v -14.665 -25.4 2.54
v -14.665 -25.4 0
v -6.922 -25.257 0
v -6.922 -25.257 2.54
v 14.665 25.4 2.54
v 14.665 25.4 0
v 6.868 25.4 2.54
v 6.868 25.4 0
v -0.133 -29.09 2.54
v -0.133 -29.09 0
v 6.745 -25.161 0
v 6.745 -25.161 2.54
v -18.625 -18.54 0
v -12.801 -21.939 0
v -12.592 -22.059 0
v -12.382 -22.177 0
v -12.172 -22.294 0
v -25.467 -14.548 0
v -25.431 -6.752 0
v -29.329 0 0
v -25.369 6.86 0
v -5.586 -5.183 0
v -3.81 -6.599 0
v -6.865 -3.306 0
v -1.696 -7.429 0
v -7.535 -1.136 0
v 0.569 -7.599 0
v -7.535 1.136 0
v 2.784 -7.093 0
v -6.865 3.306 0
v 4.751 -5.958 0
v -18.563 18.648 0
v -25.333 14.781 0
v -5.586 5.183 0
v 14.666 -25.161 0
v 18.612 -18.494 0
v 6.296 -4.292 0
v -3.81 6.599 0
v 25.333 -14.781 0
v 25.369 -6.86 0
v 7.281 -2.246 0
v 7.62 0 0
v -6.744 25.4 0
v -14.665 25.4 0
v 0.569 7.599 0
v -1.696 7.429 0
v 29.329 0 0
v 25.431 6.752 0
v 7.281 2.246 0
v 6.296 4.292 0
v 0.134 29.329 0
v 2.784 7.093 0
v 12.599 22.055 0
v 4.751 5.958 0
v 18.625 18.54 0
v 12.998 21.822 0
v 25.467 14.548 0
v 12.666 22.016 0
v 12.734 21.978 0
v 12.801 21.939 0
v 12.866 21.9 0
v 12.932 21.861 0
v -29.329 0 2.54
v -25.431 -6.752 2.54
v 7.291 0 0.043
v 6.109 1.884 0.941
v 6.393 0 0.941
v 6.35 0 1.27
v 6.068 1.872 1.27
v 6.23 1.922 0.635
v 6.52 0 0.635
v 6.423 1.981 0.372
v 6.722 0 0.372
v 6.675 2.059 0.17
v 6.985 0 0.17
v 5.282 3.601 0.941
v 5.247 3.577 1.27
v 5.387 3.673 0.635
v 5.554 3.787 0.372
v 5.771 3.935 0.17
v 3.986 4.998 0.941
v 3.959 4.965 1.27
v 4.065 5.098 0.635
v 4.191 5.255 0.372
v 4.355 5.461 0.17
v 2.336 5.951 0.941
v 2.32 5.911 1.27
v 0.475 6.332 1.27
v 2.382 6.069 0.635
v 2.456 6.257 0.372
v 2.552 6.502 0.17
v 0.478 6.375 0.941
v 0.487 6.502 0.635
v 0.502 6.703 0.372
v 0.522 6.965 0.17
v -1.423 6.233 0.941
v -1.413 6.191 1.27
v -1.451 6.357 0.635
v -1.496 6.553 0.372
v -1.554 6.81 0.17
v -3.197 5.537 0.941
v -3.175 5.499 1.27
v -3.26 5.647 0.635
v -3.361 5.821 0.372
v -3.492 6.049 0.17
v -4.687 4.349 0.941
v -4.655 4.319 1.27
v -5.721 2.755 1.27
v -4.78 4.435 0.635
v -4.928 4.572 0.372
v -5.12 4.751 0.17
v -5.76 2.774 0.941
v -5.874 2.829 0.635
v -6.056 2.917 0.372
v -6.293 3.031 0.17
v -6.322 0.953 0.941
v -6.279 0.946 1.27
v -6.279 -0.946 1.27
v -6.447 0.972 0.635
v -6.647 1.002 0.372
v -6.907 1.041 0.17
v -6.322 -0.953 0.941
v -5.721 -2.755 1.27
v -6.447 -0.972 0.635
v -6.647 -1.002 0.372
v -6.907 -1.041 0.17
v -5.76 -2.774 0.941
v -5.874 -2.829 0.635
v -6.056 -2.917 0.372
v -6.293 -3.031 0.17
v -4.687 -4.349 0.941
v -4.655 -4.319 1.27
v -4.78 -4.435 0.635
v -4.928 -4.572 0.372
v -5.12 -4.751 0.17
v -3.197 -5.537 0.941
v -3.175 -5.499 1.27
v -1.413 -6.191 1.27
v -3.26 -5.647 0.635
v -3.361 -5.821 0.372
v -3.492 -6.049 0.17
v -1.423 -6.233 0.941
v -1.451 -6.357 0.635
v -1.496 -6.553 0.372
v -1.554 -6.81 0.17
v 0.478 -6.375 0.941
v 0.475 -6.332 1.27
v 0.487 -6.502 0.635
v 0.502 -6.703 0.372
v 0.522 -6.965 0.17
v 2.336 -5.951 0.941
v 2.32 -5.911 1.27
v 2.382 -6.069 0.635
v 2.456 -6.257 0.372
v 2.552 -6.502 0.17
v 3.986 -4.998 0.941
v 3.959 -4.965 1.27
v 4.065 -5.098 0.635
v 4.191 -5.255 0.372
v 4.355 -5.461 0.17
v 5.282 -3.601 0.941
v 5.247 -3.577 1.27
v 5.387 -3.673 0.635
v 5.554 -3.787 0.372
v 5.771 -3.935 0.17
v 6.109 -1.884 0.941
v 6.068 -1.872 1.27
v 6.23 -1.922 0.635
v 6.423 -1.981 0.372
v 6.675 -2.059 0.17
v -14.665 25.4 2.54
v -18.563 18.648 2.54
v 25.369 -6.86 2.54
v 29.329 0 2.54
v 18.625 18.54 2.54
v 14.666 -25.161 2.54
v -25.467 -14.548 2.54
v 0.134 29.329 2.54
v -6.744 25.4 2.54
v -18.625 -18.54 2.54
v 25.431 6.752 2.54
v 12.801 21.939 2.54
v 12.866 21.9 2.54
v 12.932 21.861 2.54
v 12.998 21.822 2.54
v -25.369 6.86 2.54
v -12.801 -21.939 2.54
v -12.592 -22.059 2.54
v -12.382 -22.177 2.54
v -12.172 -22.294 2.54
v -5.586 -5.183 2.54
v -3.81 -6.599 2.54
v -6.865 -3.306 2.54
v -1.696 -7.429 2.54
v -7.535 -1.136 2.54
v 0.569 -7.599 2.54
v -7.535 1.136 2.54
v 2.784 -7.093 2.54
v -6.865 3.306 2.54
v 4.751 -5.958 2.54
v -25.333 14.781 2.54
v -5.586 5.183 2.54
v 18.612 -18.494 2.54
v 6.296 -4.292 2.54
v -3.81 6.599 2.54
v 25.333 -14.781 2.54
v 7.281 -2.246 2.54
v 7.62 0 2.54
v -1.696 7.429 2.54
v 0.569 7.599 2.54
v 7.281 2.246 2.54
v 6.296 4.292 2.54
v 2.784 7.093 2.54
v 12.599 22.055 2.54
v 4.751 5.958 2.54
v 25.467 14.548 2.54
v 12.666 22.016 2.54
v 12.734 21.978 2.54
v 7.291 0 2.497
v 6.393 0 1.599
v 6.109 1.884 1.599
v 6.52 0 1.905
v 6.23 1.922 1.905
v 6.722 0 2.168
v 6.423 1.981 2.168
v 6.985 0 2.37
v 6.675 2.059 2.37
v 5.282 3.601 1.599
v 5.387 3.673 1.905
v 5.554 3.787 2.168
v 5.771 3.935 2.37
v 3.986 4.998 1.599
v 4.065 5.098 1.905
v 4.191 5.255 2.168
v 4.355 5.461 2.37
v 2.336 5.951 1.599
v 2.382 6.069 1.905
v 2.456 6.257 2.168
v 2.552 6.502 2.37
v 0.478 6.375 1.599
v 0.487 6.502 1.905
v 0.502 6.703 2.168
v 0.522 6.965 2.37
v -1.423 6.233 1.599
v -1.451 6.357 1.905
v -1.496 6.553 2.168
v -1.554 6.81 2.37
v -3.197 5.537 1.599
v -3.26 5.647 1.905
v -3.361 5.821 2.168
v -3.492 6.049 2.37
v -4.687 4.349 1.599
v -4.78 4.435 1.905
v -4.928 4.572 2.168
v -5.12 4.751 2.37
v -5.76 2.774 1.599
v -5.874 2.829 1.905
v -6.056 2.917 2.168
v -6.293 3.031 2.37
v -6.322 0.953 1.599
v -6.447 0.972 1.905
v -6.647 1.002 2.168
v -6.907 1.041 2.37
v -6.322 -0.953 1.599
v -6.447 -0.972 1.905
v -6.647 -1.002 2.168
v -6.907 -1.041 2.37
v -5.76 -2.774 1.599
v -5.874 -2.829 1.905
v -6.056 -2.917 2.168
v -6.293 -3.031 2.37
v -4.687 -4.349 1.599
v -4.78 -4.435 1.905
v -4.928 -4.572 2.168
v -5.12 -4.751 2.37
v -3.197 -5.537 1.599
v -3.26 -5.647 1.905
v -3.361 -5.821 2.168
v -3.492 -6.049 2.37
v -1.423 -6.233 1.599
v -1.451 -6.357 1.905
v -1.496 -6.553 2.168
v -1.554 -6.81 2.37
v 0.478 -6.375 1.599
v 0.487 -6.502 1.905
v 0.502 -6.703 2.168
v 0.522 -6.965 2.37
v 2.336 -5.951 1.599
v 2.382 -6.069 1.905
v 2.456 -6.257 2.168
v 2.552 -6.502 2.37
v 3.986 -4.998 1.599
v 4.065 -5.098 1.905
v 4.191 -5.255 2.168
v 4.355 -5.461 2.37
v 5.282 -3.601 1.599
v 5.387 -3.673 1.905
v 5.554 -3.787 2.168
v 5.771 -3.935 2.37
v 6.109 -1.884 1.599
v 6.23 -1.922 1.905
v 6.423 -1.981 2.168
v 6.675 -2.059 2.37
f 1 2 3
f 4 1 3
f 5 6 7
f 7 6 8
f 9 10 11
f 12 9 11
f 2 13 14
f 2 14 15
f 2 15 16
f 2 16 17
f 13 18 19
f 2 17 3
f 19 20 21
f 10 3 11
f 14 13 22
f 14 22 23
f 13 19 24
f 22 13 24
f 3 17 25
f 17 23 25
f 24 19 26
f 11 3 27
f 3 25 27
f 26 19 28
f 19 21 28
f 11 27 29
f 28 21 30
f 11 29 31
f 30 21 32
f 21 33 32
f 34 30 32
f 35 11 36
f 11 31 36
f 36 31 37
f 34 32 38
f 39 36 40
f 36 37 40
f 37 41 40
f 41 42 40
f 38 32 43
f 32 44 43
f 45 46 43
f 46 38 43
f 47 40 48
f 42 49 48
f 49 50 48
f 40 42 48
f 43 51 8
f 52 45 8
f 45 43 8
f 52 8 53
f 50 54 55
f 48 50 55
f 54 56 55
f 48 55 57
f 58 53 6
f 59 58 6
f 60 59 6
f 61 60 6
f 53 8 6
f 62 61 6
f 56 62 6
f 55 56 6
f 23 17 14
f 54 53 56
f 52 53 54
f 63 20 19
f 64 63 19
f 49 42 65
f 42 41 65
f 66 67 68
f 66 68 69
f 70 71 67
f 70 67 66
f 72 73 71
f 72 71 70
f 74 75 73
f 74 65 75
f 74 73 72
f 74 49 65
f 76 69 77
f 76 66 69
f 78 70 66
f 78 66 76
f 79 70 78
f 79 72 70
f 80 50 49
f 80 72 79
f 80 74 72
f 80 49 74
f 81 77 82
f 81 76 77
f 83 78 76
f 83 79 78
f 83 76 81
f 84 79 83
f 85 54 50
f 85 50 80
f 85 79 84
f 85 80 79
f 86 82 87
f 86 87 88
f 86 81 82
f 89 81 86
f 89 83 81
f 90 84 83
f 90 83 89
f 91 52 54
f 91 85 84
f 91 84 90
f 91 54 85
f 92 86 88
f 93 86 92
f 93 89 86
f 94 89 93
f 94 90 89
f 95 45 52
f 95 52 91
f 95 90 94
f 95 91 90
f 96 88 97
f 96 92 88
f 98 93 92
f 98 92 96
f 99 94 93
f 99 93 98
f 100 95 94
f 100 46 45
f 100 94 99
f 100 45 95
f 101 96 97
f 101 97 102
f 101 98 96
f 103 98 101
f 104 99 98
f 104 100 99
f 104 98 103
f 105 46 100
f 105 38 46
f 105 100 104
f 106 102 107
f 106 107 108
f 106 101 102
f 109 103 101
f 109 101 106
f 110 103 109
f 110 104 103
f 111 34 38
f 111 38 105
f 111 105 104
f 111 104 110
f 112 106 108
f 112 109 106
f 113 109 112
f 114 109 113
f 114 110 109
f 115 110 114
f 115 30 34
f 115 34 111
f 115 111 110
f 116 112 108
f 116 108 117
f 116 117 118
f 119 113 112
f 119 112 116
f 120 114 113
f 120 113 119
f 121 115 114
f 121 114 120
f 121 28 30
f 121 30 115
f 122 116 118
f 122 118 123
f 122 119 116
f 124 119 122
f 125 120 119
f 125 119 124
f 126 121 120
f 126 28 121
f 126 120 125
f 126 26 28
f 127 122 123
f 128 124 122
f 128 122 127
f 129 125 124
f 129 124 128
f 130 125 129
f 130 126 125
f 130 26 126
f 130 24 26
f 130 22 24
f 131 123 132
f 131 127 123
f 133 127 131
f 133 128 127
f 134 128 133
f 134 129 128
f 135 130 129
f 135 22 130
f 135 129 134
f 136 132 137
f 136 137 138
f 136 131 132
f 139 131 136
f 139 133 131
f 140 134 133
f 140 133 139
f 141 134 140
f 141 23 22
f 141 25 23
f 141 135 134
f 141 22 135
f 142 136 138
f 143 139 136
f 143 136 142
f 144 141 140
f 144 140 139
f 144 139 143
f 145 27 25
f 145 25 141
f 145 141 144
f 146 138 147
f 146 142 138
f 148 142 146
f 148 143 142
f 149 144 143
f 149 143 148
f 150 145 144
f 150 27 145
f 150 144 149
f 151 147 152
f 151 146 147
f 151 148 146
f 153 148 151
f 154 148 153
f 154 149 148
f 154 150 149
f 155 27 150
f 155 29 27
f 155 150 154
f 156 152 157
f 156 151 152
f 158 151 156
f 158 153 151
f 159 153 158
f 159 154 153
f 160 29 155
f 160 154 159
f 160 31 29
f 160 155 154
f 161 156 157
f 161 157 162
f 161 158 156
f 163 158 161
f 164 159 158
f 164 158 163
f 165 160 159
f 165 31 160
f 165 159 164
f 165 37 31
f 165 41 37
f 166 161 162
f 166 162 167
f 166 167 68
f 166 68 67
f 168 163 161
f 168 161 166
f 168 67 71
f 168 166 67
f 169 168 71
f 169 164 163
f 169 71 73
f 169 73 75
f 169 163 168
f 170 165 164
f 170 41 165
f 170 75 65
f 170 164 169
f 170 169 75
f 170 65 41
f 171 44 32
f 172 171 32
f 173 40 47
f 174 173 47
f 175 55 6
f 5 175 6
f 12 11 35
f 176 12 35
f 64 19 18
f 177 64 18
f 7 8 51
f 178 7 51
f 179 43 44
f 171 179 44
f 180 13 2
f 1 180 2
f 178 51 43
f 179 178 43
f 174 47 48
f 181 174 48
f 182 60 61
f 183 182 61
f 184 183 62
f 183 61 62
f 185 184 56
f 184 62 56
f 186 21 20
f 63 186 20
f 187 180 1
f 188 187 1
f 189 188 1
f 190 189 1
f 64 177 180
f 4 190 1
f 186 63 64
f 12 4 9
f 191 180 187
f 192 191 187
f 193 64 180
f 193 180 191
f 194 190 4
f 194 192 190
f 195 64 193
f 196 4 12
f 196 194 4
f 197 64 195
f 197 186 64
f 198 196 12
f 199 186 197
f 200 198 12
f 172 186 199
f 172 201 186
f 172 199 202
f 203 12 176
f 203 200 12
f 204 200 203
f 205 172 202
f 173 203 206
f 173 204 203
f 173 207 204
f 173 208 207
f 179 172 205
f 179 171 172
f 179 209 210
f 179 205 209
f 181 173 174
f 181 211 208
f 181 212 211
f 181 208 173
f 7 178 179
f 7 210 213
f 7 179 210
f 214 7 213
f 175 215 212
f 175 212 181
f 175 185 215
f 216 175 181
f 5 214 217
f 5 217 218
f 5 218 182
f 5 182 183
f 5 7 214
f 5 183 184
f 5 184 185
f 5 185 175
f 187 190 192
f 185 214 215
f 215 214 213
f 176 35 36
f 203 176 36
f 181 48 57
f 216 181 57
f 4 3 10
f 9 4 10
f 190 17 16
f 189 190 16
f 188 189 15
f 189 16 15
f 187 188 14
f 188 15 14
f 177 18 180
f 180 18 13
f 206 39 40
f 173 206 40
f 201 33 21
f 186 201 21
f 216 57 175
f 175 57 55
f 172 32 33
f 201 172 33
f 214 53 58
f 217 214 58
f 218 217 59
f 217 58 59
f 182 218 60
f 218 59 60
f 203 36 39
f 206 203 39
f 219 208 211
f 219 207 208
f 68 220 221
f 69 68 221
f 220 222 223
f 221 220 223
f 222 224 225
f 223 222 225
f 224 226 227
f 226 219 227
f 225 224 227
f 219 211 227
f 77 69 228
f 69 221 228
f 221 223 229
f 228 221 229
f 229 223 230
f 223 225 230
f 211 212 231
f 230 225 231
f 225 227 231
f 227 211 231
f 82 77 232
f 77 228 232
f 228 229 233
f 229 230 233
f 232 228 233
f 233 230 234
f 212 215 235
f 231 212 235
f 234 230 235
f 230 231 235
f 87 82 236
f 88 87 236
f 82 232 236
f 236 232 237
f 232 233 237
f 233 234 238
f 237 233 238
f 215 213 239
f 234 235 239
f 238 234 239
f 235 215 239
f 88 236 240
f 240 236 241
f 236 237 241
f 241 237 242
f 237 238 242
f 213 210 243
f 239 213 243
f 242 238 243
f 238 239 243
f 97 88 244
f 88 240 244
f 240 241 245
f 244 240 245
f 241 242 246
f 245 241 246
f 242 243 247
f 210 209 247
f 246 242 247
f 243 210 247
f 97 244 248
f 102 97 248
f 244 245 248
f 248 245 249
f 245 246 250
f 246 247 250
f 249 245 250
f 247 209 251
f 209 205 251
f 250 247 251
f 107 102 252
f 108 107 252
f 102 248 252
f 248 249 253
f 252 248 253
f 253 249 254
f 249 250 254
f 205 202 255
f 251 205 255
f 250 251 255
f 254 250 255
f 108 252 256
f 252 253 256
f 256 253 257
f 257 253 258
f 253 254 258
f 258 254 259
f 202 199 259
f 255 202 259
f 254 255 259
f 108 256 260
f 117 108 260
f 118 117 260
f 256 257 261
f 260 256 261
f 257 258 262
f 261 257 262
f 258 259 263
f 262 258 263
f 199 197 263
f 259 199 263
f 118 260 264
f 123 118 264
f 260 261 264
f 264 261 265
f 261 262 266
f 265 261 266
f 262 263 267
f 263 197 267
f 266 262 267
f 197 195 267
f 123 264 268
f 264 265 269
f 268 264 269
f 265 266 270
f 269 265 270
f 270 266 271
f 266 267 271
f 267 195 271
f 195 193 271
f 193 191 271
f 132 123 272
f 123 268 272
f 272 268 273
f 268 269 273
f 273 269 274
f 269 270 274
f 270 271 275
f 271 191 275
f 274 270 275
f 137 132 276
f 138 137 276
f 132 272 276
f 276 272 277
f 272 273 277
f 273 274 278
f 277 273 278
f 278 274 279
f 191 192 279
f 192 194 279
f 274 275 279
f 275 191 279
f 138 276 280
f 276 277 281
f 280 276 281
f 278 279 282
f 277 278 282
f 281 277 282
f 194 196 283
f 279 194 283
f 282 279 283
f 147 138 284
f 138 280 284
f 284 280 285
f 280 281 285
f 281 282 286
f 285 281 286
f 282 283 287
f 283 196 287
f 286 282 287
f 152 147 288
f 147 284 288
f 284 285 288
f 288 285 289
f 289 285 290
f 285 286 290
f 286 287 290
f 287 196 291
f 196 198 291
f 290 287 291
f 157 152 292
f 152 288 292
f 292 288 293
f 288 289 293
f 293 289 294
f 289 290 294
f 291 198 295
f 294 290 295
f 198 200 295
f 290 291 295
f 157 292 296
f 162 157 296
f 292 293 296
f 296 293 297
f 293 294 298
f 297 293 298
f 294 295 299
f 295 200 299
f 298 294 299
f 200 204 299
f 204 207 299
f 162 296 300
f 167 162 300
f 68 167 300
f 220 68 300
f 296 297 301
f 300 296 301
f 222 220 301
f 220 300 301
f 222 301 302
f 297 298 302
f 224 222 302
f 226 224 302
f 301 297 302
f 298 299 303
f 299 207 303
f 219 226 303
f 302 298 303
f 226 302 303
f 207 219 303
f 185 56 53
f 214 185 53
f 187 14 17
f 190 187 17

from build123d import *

# Parameters (mm, degrees)
F0_R     = 6.35
F1_DEPTH = 2.54
F2_R     = 1.26999


# Not quite as in the source:
# - a fillet or chamfer is up to 0.001 mm smaller than in the source, because OpenCascade refuses the exact size


with BuildPart() as f1:
    # F0 (on Top) → F1 (new body)
    with BuildSketch(Plane.XY):
        with BuildLine():
            Line((0.1342973504, 29.3290862039), (12.5991438484, 22.0549671115))
            ThreePointArc((12.5991438484, 22.0549671115), (12.7000000903, 21.997045204), (12.8005900541, 21.9386620893))
            Line((12.8005900541, 21.9386620893), (6.8682756911, 25.4))
            Line((6.8682756911, 25.4), (0.1342973504, 29.3290862039))
        make_face()
        with BuildLine():
            ThreePointArc((-12.5991438484, 22.0549671115), (0, 25.4), (12.5991438484, 22.0549671115))
            Line((12.5991438484, 22.0549671115), (0.1342973504, 29.3290862039))
            Line((0.1342973504, 29.3290862039), (-6.7436197563, 25.4))
            Line((-6.7436197563, 25.4), (-12.5991438484, 22.0549671115))
        make_face()
        Polygon((-18.5629074106, 18.6481012287), (-12.5991438484, 22.0549671115), (-6.7436197563, 25.4), (-14.6646968374, 25.4), align=None)
        with BuildLine():
            ThreePointArc((-25.3997337218, 0.1163050384), (-21.9386621638, 12.8005899263), (-12.5991438484, 22.0549671115))
            Line((-12.5991438484, 22.0549671115), (-18.5629074106, 18.6481012287))
            Line((-18.5629074106, 18.6481012287), (-25.3325850472, 14.780848019))
            Line((-25.3325850472, 14.780848019), (-25.3688551343, 6.8598539776))
            Line((-25.3688551343, 6.8598539776), (-25.3997337218, 0.1163050384))
        make_face()
        with BuildLine():
            Line((18.625235378, 18.5401460224), (12.8005900541, 21.9386620893))
            ThreePointArc((12.8005900541, 21.9386620893), (12.8993470878, 21.8807414113), (12.9978420445, 21.822376181))
            Line((12.9978420446, 21.822376181), (25.4668823975, 14.5482381848))
            Line((25.4668823975, 14.5482381848), (18.625235378, 18.5401460224))
        make_face()
        Polygon((6.8682756911, 25.4), (12.8005900541, 21.9386620893), (18.625235378, 18.5401460224), (14.6646968374, 25.4), align=None)
        with BuildLine():
            Line((25.4668823975, 14.5482381848), (12.9978420446, 21.822376181))
            ThreePointArc((12.9978420445, 21.822376181), (22.0828574683, 12.550195458), (25.4, 0))
            ThreePointArc((25.4, 0), (25.3999334305, -0.0581525957), (25.3997337225, -0.1163048866))
            Line((25.3997337225, -0.1163048866), (25.4002662804, 0))
            Line((25.4002662804, 0), (25.4311831017, 6.7518987713))
            Line((25.4311831017, 6.7518987713), (25.4668823975, 14.5482381848))
        make_face()
        Polygon((-25.4002662804, 0), (-25.3997337218, 0.1163050384), (-25.3688551343, 6.8598539776), (-29.3293936748, 0), (-25.4311831017, -6.7518987713), align=None)
        with BuildLine():
            ThreePointArc((-21.9970455091, -12.6999995618), (-24.5495027703, -6.5178151043), (-25.3997337218, 0.1163050384))
            Line((-25.3997337218, 0.1163050384), (-25.4002662804, 0))
            Line((-25.4002662804, 0), (-25.4311831017, -6.7518987713))
            Line((-25.4311831017, -6.7518987713), (-21.9970455091, -12.6999995618))
        make_face()
        with BuildLine():
            ThreePointArc((-12.800589874, -21.9386621944), (-18.0015854544, -17.9193448856), (-21.9970455091, -12.6999995618))
            Line((-21.9970455091, -12.6999995618), (-18.625235378, -18.5401460224))
            Line((-18.625235378, -18.5401460224), (-12.800589874, -21.9386621944))
        make_face()
        Polygon((-18.625235378, -18.5401460224), (-21.9970455091, -12.6999995618), (-25.4311831017, -6.7518987713), (-25.4668823975, -14.5482381848), align=None)
        with BuildLine():
            Line((25.3688551343, -6.8598539776), (25.3997337225, -0.1163048866))
            ThreePointArc((25.3997337225, -0.1163048866), (22.6367712709, -11.5211365077), (15.0421744156, -20.4668754052))
            Line((15.0421744156, -20.4668754052), (18.6118299226, -18.4944410973))
            Line((18.6118299226, -18.4944410973), (25.3325850472, -14.780848019))
            Line((25.3325850472, -14.780848019), (25.3688551343, -6.8598539776))
        make_face()
        Polygon((25.4002662804, 0), (25.3997337225, -0.1163048866), (25.3688551343, -6.8598539776), (29.3293936748, 0), (25.4311831017, 6.7518987713), align=None)
        with BuildLine():
            ThreePointArc((-12.1717221157, -22.2937027149), (-12.4874178664, -22.1184175526), (-12.800589874, -21.9386621944))
            Line((-12.800589874, -21.9386621944), (-18.625235378, -18.5401460224))
            Line((-18.625235378, -18.5401460224), (-14.6646968374, -25.4))
            Line((-14.6646968374, -25.4), (-6.9223574365, -25.2573419592))
            Line((-6.9223574365, -25.2573419592), (-12.1717221157, -22.2937027149))
        make_face()
        with BuildLine():
            Line((18.6118299226, -18.4944410973), (15.0421744156, -20.4668754052))
            ThreePointArc((15.0421744156, -20.4668754052), (12.4565037471, -22.1358423015), (9.6879678482, -23.4798483592))
            Line((9.6879678482, -23.4798483592), (6.7447131478, -25.1612151536))
            Line((6.7447131478, -25.1612151536), (14.6657902289, -25.1612151536))
            Line((14.6657902289, -25.1612151536), (18.6118299226, -18.4944410973))
        make_face()
        with BuildLine():
            ThreePointArc((9.6879678482, -23.4798483592), (-1.3762246139, -25.3626892465), (-12.1717221157, -22.2937027149))
            Line((-12.1717221157, -22.2937027149), (-6.9223574365, -25.2573419592))
            Line((-6.9223574365, -25.2573419592), (-0.1332039589, -29.0903013575))
            Line((-0.1332039589, -29.0903013575), (6.7447131478, -25.1612151536))
            Line((6.7447131478, -25.1612151536), (9.6879678482, -23.4798483592))
        make_face()
        with BuildLine():
            Line((12.9978420446, 21.822376181), (12.5991438484, 22.0549671115))
            ThreePointArc((12.5991438484, 22.0549671115), (0, 25.4), (-12.5991438484, 22.0549671115))
            ThreePointArc((-12.5991438484, 22.0549671115), (-21.9386621638, 12.8005899263), (-25.3997337218, 0.1163050384))
            ThreePointArc((-25.3997337218, 0.1163050384), (-24.5495027703, -6.5178151043), (-21.9970455091, -12.6999995618))
            ThreePointArc((-21.9970455091, -12.6999995618), (-18.0015854544, -17.9193448856), (-12.800589874, -21.9386621944))
            Line((-12.800589874, -21.9386621944), (-12.1717221157, -22.2937027149))
            ThreePointArc((-12.1717221157, -22.2937027149), (-1.3762246139, -25.3626892465), (9.6879678482, -23.4798483592))
            Line((9.6879678482, -23.4798483592), (12.6002372398, -21.8161822651))
            Line((12.6002372398, -21.8161822651), (15.0421744156, -20.4668754052))
            ThreePointArc((15.0421744156, -20.4668754052), (22.6367712709, -11.5211365077), (25.3997337225, -0.1163048866))
            ThreePointArc((25.3997337225, -0.1163048866), (25.3999334305, -0.0581525957), (25.4, 0))
            ThreePointArc((25.4, 0), (22.0828574683, 12.550195458), (12.9978420445, 21.822376181))
        make_face()
        Circle(F0_R, mode=Mode.SUBTRACT)
        with BuildLine():
            ThreePointArc((9.6879678482, -23.4798483592), (12.4565037471, -22.1358423015), (15.0421744156, -20.4668754052))
            Line((15.0421744156, -20.4668754052), (12.6002372398, -21.8161822651))
            Line((12.6002372398, -21.8161822651), (9.6879678482, -23.4798483592))
        make_face()
    extrude(amount=F1_DEPTH)

    # F2 (radius 1.27 in the source; OpenCascade refuses exactly that, so slightly less here)
    f2_edges = [f1.edges().sort_by_distance(p)[0] for p in [
        (-6.35, 0, 2.54),
        (-6.35, 0, 0),
    ]]
    fillet(f2_edges, radius=F2_R)


solid = f1.part
